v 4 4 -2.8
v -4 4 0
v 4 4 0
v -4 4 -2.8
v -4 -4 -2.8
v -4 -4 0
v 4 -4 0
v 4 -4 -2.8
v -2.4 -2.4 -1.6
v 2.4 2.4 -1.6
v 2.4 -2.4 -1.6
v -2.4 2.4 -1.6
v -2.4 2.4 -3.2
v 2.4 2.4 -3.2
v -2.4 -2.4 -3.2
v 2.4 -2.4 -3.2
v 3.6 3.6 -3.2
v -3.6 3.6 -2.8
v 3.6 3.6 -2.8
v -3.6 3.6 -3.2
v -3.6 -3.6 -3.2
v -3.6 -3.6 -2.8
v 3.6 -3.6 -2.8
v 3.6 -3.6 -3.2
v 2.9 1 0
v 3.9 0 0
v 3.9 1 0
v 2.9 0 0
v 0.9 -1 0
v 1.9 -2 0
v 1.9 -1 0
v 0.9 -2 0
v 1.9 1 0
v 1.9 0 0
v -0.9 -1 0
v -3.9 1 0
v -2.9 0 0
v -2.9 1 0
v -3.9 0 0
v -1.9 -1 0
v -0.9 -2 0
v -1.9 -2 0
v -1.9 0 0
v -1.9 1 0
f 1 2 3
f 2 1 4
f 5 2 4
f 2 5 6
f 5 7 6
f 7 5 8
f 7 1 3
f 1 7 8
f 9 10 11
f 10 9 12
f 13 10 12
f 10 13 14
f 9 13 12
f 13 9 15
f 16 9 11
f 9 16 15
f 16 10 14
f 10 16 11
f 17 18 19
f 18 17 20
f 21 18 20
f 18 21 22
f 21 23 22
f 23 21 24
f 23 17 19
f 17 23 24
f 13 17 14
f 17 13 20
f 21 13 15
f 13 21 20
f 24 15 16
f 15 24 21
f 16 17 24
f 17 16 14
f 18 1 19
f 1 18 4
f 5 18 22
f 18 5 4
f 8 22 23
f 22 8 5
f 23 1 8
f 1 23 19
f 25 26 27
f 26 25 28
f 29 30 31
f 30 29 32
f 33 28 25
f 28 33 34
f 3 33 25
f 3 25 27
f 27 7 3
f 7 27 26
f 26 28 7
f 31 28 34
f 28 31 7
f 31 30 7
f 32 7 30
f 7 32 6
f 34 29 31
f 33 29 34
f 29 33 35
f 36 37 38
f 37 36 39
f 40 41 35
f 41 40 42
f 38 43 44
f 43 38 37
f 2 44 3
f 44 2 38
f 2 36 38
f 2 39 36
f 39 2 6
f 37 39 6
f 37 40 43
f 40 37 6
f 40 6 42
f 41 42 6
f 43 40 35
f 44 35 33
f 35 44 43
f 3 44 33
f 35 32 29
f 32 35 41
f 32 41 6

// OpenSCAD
// file: ../p/4-4edge.scad
use <../lib.scad>
$fa=1; $fs=0.2;
function ldraw_lib__4_4edge(realsolid=false) = [
// 0 Circle 1.0
// 0 Name: 4-4edge.dat
// 0 Author: James Jessiman
// 0 !LDRAW_ORG Primitive UPDATE 2017-01
// 0 !LICENSE Licensed under CC BY 2.0 and CC BY 4.0 : see CAreadme.txt
// 
// 0 BFC CERTIFY CCW
  [0,"BFC","CERTIFY"],
  [0,"BFC","CCW"],
// 
// 0 !HISTORY 1998-12-15 [PTadmin] Official Update 1998-10
// 0 !HISTORY 2005-12-28 [PTadmin] Official Update 2005-01
// 0 !HISTORY 2007-06-24 [PTadmin] Header formatted for Contributor Agreement
// 0 !HISTORY 2008-07-01 [PTadmin] Official Update 2008-01
// 0 !HISTORY 2017-01-15 [Steffen] BFCed
// 0 !HISTORY 2017-12-30 [PTadmin] Official Update 2017-01
// 
// 
// 2 24 1 0 0 0.9239 0 0.3827
  [2,24,1,0,0,0.9239,0,0.3827],
// 2 24 0.9239 0 0.3827 0.7071 0 0.7071
  [2,24,0.9239,0,0.3827,0.7071,0,0.7071],
// 2 24 0.7071 0 0.7071 0.3827 0 0.9239
  [2,24,0.7071,0,0.7071,0.3827,0,0.9239],
// 2 24 0.3827 0 0.9239 0 0 1
  [2,24,0.3827,0,0.9239,0,0,1],
// 2 24 0 0 1 -0.3827 0 0.9239
  [2,24,0,0,1,-0.3827,0,0.9239],
// 2 24 -0.3827 0 0.9239 -0.7071 0 0.7071
  [2,24,-0.3827,0,0.9239,-0.7071,0,0.7071],
// 2 24 -0.7071 0 0.7071 -0.9239 0 0.3827
  [2,24,-0.7071,0,0.7071,-0.9239,0,0.3827],
// 2 24 -0.9239 0 0.3827 -1 0 -0
  [2,24,-0.9239,0,0.3827,-1,0,-0],
// 2 24 -1 0 -0 -0.9239 0 -0.3827
  [2,24,-1,0,-0,-0.9239,0,-0.3827],
// 2 24 -0.9239 0 -0.3827 -0.7071 0 -0.7071
  [2,24,-0.9239,0,-0.3827,-0.7071,0,-0.7071],
// 2 24 -0.7071 0 -0.7071 -0.3827 0 -0.9239
  [2,24,-0.7071,0,-0.7071,-0.3827,0,-0.9239],
// 2 24 -0.3827 0 -0.9239 0 0 -1
  [2,24,-0.3827,0,-0.9239,0,0,-1],
// 2 24 0 0 -1 0.3827 0 -0.9239
  [2,24,0,0,-1,0.3827,0,-0.9239],
// 2 24 0.3827 0 -0.9239 0.7071 0 -0.7071
  [2,24,0.3827,0,-0.9239,0.7071,0,-0.7071],
// 2 24 0.7071 0 -0.7071 0.9239 0 -0.3827
  [2,24,0.7071,0,-0.7071,0.9239,0,-0.3827],
// 2 24 0.9239 0 -0.3827 1 0 0
  [2,24,0.9239,0,-0.3827,1,0,0],
];
module ldraw_lib__4_4edge(step=0, col=false, unit=2/5, alt=false, line=0.2, solid=!$preview)
    makepoly(ldraw_lib__4_4edge(solid), step=step, col=col, unit=unit, alt=alt, line=line, solid=solid);
ldraw_lib__4_4edge(line=0.2);
// file: ../p/4-4disc.scad
use <../lib.scad>
$fa=1; $fs=0.2;
function ldraw_lib__4_4disc(realsolid=false) = [
// 0 Disc 1.0
// 0 Name: 4-4disc.dat
// 0 Author: James Jessiman
// 0 !LDRAW_ORG Primitive UPDATE 2002-02
// 0 !LICENSE Licensed under CC BY 2.0 and CC BY 4.0 : see CAreadme.txt
// 
// 0 BFC CERTIFY CCW
  [0,"BFC","CERTIFY"],
  [0,"BFC","CCW"],
// 
// 0 !HISTORY 1998-12-15 [PTadmin] Official Update 1998-10
// 0 !HISTORY 2002-03-23 [sbliss] Added BFC statement
// 0 !HISTORY 2002-04-25 [PTadmin] Official Update 2002-02
// 0 !HISTORY 2007-06-24 [PTadmin] Header formatted for Contributor Agreement
// 0 !HISTORY 2008-07-01 [PTadmin] Official Update 2008-01
// 
// 
// 3 16 0 0 0 1 0 0 0.9239 0 0.3827
  [3,16,0,0,0,1,0,0,0.9239,0,0.3827],
// 3 16 0 0 0 0.9239 0 0.3827 0.7071 0 0.7071
  [3,16,0,0,0,0.9239,0,0.3827,0.7071,0,0.7071],
// 3 16 0 0 0 0.7071 0 0.7071 0.3827 0 0.9239
  [3,16,0,0,0,0.7071,0,0.7071,0.3827,0,0.9239],
// 3 16 0 0 0 0.3827 0 0.9239 0 0 1
  [3,16,0,0,0,0.3827,0,0.9239,0,0,1],
// 3 16 0 0 0 0 0 1 -0.3827 0 0.9239
  [3,16,0,0,0,0,0,1,-0.3827,0,0.9239],
// 3 16 0 0 0 -0.3827 0 0.9239 -0.7071 0 0.7071
  [3,16,0,0,0,-0.3827,0,0.9239,-0.7071,0,0.7071],
// 3 16 0 0 0 -0.7071 0 0.7071 -0.9239 0 0.3827
  [3,16,0,0,0,-0.7071,0,0.7071,-0.9239,0,0.3827],
// 3 16 0 0 0 -0.9239 0 0.3827 -1 0 -0
  [3,16,0,0,0,-0.9239,0,0.3827,-1,0,-0],
// 3 16 0 0 0 -1 0 -0 -0.9239 0 -0.3827
  [3,16,0,0,0,-1,0,-0,-0.9239,0,-0.3827],
// 3 16 0 0 0 -0.9239 0 -0.3827 -0.7071 0 -0.7071
  [3,16,0,0,0,-0.9239,0,-0.3827,-0.7071,0,-0.7071],
// 3 16 0 0 0 -0.7071 0 -0.7071 -0.3827 0 -0.9239
  [3,16,0,0,0,-0.7071,0,-0.7071,-0.3827,0,-0.9239],
// 3 16 0 0 0 -0.3827 0 -0.9239 0 0 -1
  [3,16,0,0,0,-0.3827,0,-0.9239,0,0,-1],
// 3 16 0 0 0 0 0 -1 0.3827 0 -0.9239
  [3,16,0,0,0,0,0,-1,0.3827,0,-0.9239],
// 3 16 0 0 0 0.3827 0 -0.9239 0.7071 0 -0.7071
  [3,16,0,0,0,0.3827,0,-0.9239,0.7071,0,-0.7071],
// 3 16 0 0 0 0.7071 0 -0.7071 0.9239 0 -0.3827
  [3,16,0,0,0,0.7071,0,-0.7071,0.9239,0,-0.3827],
// 3 16 0 0 0 0.9239 0 -0.3827 1 0 0
  [3,16,0,0,0,0.9239,0,-0.3827,1,0,0],
// 0
];
module ldraw_lib__4_4disc(step=0, col=false, unit=2/5, alt=false, line=0.2, solid=!$preview)
    makepoly(ldraw_lib__4_4disc(solid), step=step, col=col, unit=unit, alt=alt, line=line, solid=solid);
ldraw_lib__4_4disc(line=0.2);
// file: ../p/4-4cyli.scad
use <../lib.scad>
$fa=1; $fs=0.2;
function ldraw_lib__4_4cyli(realsolid=false) = [
// 0 Cylinder 1.0
// 0 Name: 4-4cyli.dat
// 0 Author: James Jessiman
// 0 !LDRAW_ORG Primitive UPDATE 2005-01
// 0 !LICENSE Licensed under CC BY 2.0 and CC BY 4.0 : see CAreadme.txt
// 
// 0 BFC CERTIFY CCW
  [0,"BFC","CERTIFY"],
  [0,"BFC","CCW"],
// 
// 0 !HISTORY 1998-12-15 [PTadmin] Official Update 1998-10
// 0 !HISTORY 2002-03-23 [sbliss] Added BFC statement; merged headers from files in distributions LDraw 0.27 and Complete.
// 0 !HISTORY 2002-04-25 [PTadmin] Official Update 2002-02
// 0 !HISTORY 2004-12-14 [guyvivan] BFC CCW
// 0 !HISTORY 2005-12-28 [PTadmin] Official Update 2005-01
// 0 !HISTORY 2007-06-24 [PTadmin] Header formatted for Contributor Agreement
// 0 !HISTORY 2008-07-01 [PTadmin] Official Update 2008-01
// 
// 
// 4 16 1 1 0 0.9239 1 0.3827 0.9239 0 0.3827 1 0 0
  [4,16,1,1,0,0.9239,1,0.3827,0.9239,0,0.3827,1,0,0],
// 5 24 1 0 0 1 1 0 0.9239 0 0.3827 0.9239 0 -0.3827
  [5,24,1,0,0,1,1,0,0.9239,0,0.3827,0.9239,0,-0.3827],
// 4 16 0.9239 1 0.3827 0.7071 1 0.7071 0.7071 0 0.7071 0.9239 0 0.3827
  [4,16,0.9239,1,0.3827,0.7071,1,0.7071,0.7071,0,0.7071,0.9239,0,0.3827],
// 5 24 0.9239 0 0.3827 0.9239 1 0.3827 0.7071 0 0.7071 1 0 0
  [5,24,0.9239,0,0.3827,0.9239,1,0.3827,0.7071,0,0.7071,1,0,0],
// 4 16 0.7071 1 0.7071 0.3827 1 0.9239 0.3827 0 0.9239 0.7071 0 0.7071
  [4,16,0.7071,1,0.7071,0.3827,1,0.9239,0.3827,0,0.9239,0.7071,0,0.7071],
// 5 24 0.7071 0 0.7071 0.7071 1 0.7071 0.3827 0 0.9239 0.9239 0 0.3827
  [5,24,0.7071,0,0.7071,0.7071,1,0.7071,0.3827,0,0.9239,0.9239,0,0.3827],
// 4 16 0.3827 1 0.9239 0 1 1 0 0 1 0.3827 0 0.9239
  [4,16,0.3827,1,0.9239,0,1,1,0,0,1,0.3827,0,0.9239],
// 5 24 0.3827 0 0.9239 0.3827 1 0.9239 0 0 1 0.7071 0 0.7071
  [5,24,0.3827,0,0.9239,0.3827,1,0.9239,0,0,1,0.7071,0,0.7071],
// 4 16 0 1 1 -0.3827 1 0.9239 -0.3827 0 0.9239 0 0 1
  [4,16,0,1,1,-0.3827,1,0.9239,-0.3827,0,0.9239,0,0,1],
// 5 24 0 0 1 0 1 1 -0.3827 0 0.9239 0.3827 0 0.9239
  [5,24,0,0,1,0,1,1,-0.3827,0,0.9239,0.3827,0,0.9239],
// 4 16 -0.3827 1 0.9239 -0.7071 1 0.7071 -0.7071 0 0.7071 -0.3827 0 0.9239
  [4,16,-0.3827,1,0.9239,-0.7071,1,0.7071,-0.7071,0,0.7071,-0.3827,0,0.9239],
// 5 24 -0.3827 0 0.9239 -0.3827 1 0.9239 -0.7071 0 0.7071 0 0 1
  [5,24,-0.3827,0,0.9239,-0.3827,1,0.9239,-0.7071,0,0.7071,0,0,1],
// 4 16 -0.7071 1 0.7071 -0.9239 1 0.3827 -0.9239 0 0.3827 -0.7071 0 0.7071
  [4,16,-0.7071,1,0.7071,-0.9239,1,0.3827,-0.9239,0,0.3827,-0.7071,0,0.7071],
// 5 24 -0.7071 0 0.7071 -0.7071 1 0.7071 -0.9239 0 0.3827 -0.3827 0 0.9239
  [5,24,-0.7071,0,0.7071,-0.7071,1,0.7071,-0.9239,0,0.3827,-0.3827,0,0.9239],
// 4 16 -0.9239 1 0.3827 -1 1 0 -1 0 0 -0.9239 0 0.3827
  [4,16,-0.9239,1,0.3827,-1,1,0,-1,0,0,-0.9239,0,0.3827],
// 5 24 -0.9239 0 0.3827 -0.9239 1 0.3827 -1 0 0 -0.7071 0 0.7071
  [5,24,-0.9239,0,0.3827,-0.9239,1,0.3827,-1,0,0,-0.7071,0,0.7071],
// 4 16 -1 1 0 -0.9239 1 -0.3827 -0.9239 0 -0.3827 -1 0 0
  [4,16,-1,1,0,-0.9239,1,-0.3827,-0.9239,0,-0.3827,-1,0,0],
// 5 24 -1 0 0 -1 1 0 -0.9239 0 -0.3827 -0.9239 0 0.3827
  [5,24,-1,0,0,-1,1,0,-0.9239,0,-0.3827,-0.9239,0,0.3827],
// 4 16 -0.9239 1 -0.3827 -0.7071 1 -0.7071 -0.7071 0 -0.7071 -0.9239 0 -0.3827
  [4,16,-0.9239,1,-0.3827,-0.7071,1,-0.7071,-0.7071,0,-0.7071,-0.9239,0,-0.3827],
// 5 24 -0.9239 0 -0.3827 -0.9239 1 -0.3827 -0.7071 0 -0.7071 -1 0 0
  [5,24,-0.9239,0,-0.3827,-0.9239,1,-0.3827,-0.7071,0,-0.7071,-1,0,0],
// 4 16 -0.7071 1 -0.7071 -0.3827 1 -0.9239 -0.3827 0 -0.9239 -0.7071 0 -0.7071
  [4,16,-0.7071,1,-0.7071,-0.3827,1,-0.9239,-0.3827,0,-0.9239,-0.7071,0,-0.7071],
// 5 24 -0.7071 0 -0.7071 -0.7071 1 -0.7071 -0.3827 0 -0.9239 -0.9239 0 -0.3827
  [5,24,-0.7071,0,-0.7071,-0.7071,1,-0.7071,-0.3827,0,-0.9239,-0.9239,0,-0.3827],
// 4 16 -0.3827 1 -0.9239 0 1 -1 0 0 -1 -0.3827 0 -0.9239
  [4,16,-0.3827,1,-0.9239,0,1,-1,0,0,-1,-0.3827,0,-0.9239],
// 5 24 -0.3827 0 -0.9239 -0.3827 1 -0.9239 0 0 -1 -0.7071 0 -0.7071
  [5,24,-0.3827,0,-0.9239,-0.3827,1,-0.9239,0,0,-1,-0.7071,0,-0.7071],
// 4 16 0 1 -1 0.3827 1 -0.9239 0.3827 0 -0.9239 0 0 -1
  [4,16,0,1,-1,0.3827,1,-0.9239,0.3827,0,-0.9239,0,0,-1],
// 5 24 0 0 -1 0 1 -1 0.3827 0 -0.9239 -0.3827 0 -0.9239
  [5,24,0,0,-1,0,1,-1,0.3827,0,-0.9239,-0.3827,0,-0.9239],
// 4 16 0.3827 1 -0.9239 0.7071 1 -0.7071 0.7071 0 -0.7071 0.3827 0 -0.9239
  [4,16,0.3827,1,-0.9239,0.7071,1,-0.7071,0.7071,0,-0.7071,0.3827,0,-0.9239],
// 5 24 0.3827 0 -0.9239 0.3827 1 -0.9239 0.7071 0 -0.7071 0 0 -1
  [5,24,0.3827,0,-0.9239,0.3827,1,-0.9239,0.7071,0,-0.7071,0,0,-1],
// 4 16 0.7071 1 -0.7071 0.9239 1 -0.3827 0.9239 0 -0.3827 0.7071 0 -0.7071
  [4,16,0.7071,1,-0.7071,0.9239,1,-0.3827,0.9239,0,-0.3827,0.7071,0,-0.7071],
// 5 24 0.7071 0 -0.7071 0.7071 1 -0.7071 0.9239 0 -0.3827 0.3827 0 -0.9239
  [5,24,0.7071,0,-0.7071,0.7071,1,-0.7071,0.9239,0,-0.3827,0.3827,0,-0.9239],
// 4 16 0.9239 1 -0.3827 1 1 0 1 0 0 0.9239 0 -0.3827
  [4,16,0.9239,1,-0.3827,1,1,0,1,0,0,0.9239,0,-0.3827],
// 5 24 0.9239 0 -0.3827 0.9239 1 -0.3827 1 0 0 0.7071 0 -0.7071
  [5,24,0.9239,0,-0.3827,0.9239,1,-0.3827,1,0,0,0.7071,0,-0.7071],
// 0
];
module ldraw_lib__4_4cyli(step=0, col=false, unit=2/5, alt=false, line=0.2, solid=!$preview)
    makepoly(ldraw_lib__4_4cyli(solid), step=step, col=col, unit=unit, alt=alt, line=line, solid=solid);
ldraw_lib__4_4cyli(line=0.2);
// file: ../p/stud3.scad
use <../lib.scad>
use <4-4cyli.scad>
use <4-4disc.scad>
use <4-4edge.scad>
$fa=1; $fs=0.2;
function ldraw_lib__stud3(realsolid=false) = realsolid ? 
    [openscad(translate([0,0,-eps()], o=cylinder(4+eps(), r=4)),2)] : [
// 0 Stud Tube Solid
// 0 Name: stud3.dat
// 0 Author: James Jessiman
// 0 !LDRAW_ORG Primitive UPDATE 2012-01
// 0 !LICENSE Licensed under CC BY 2.0 and CC BY 4.0 : see CAreadme.txt
// 
// 0 BFC CERTIFY CCW
  [0,"BFC","CERTIFY"],
  [0,"BFC","CCW"],
// 
// 0 !HISTORY 2002-04-04 [sbliss] Modified for BFC compliance
// 0 !HISTORY 2002-04-25 [PTadmin] Official Update 2002-02
// 0 !HISTORY 2007-06-24 [PTadmin] Header formatted for Contributor Agreement
// 0 !HISTORY 2008-07-01 [PTadmin] Official Update 2008-01
// 0 !HISTORY 2012-02-16 [Philo] Changed to CCW
// 0 !HISTORY 2012-03-30 [PTadmin] Official Update 2012-01
// 
// 
// 1 16 0 -4 0 4 0 0 0 1 0 0 0 4 4-4edge.dat
  [1,16,0,-4,0,4,0,0,0,1,0,0,0,4, ldraw_lib__4_4edge(realsolid)],
// 1 16 0 0 0 4 0 0 0 1 0 0 0 4 4-4edge.dat
  [1,16,0,0,0,4,0,0,0,1,0,0,0,4, ldraw_lib__4_4edge(realsolid)],
// 1 16 0 -4 0 4 0 0 0 1 0 0 0 4 4-4disc.dat
  [1,16,0,-4,0,4,0,0,0,1,0,0,0,4, ldraw_lib__4_4disc(realsolid)],
// 1 16 0 -4 0 4 0 0 0 4 0 0 0 4 4-4cyli.dat
  [1,16,0,-4,0,4,0,0,0,4,0,0,0,4, ldraw_lib__4_4cyli(realsolid)],
];
module ldraw_lib__stud3(step=0, col=false, unit=2/5, alt=false, line=0.2, solid=!$preview)
    makepoly(ldraw_lib__stud3(solid), step=step, col=col, unit=unit, alt=alt, line=line, solid=solid);
ldraw_lib__stud3(line=0.2);
// file: ../p/stud.scad
use <../lib.scad>
use <4-4cyli.scad>
use <4-4disc.scad>
use <4-4edge.scad>
$fa=1; $fs=0.2;
function ldraw_lib__stud(realsolid=false) = realsolid ? 
    [openscad(translate([0,0,-eps()], o=cylinder(4+eps(), r=6)),2)] : [
// 0 Stud
// 0 Name: stud.dat
// 0 Author: James Jessiman
// 0 !LDRAW_ORG Primitive UPDATE 2012-01
// 0 !LICENSE Licensed under CC BY 2.0 and CC BY 4.0 : see CAreadme.txt
// 
// 0 BFC CERTIFY CCW
  [0,"BFC","CERTIFY"],
  [0,"BFC","CCW"],
// 
// 0 !HISTORY 2002-04-04 [sbliss] Modified for BFC compliance
// 0 !HISTORY 2002-04-25 [PTadmin] Official Update 2002-02
// 0 !HISTORY 2007-06-24 [PTadmin] Header formatted for Contributor Agreement
// 0 !HISTORY 2008-07-01 [PTadmin] Official Update 2008-01
// 0 !HISTORY 2012-02-16 [Philo] Changed to CCW
// 0 !HISTORY 2012-03-30 [PTadmin] Official Update 2012-01
// 
// 
// 1 16 0 0 0 6 0 0 0 1 0 0 0 6 4-4edge.dat
  [1,16,0,0,0,6,0,0,0,1,0,0,0,6, ldraw_lib__4_4edge(realsolid)],
// 1 16 0 -4 0 6 0 0 0 1 0 0 0 6 4-4edge.dat
  [1,16,0,-4,0,6,0,0,0,1,0,0,0,6, ldraw_lib__4_4edge(realsolid)],
// 1 16 0 0 0 6 0 0 0 -4 0 0 0 6 4-4cyli.dat
  [1,16,0,0,0,6,0,0,0,-4,0,0,0,6, ldraw_lib__4_4cyli(realsolid)],
// 1 16 0 -4 0 6 0 0 0 1 0 0 0 6 4-4disc.dat
  [1,16,0,-4,0,6,0,0,0,1,0,0,0,6, ldraw_lib__4_4disc(realsolid)],
];
module ldraw_lib__stud(step=0, col=false, unit=2/5, alt=false, line=0.2, solid=!$preview)
    makepoly(ldraw_lib__stud(solid), step=step, col=col, unit=unit, alt=alt, line=line, solid=solid);
ldraw_lib__stud(line=0.2);
// file: ../p/box4t.scad
use <../lib.scad>
$fa=1; $fs=0.2;
function ldraw_lib__box4t(realsolid=false) = [
// 0 Box with 4 Adjacent Faces and All Edges
// 0 Name: box4t.dat
// 0 Author: Tore Eriksson [Tore_Eriksson]
// 0 !LDRAW_ORG Primitive UPDATE 2003-02
// 0 !LICENSE Licensed under CC BY 2.0 and CC BY 4.0 : see CAreadme.txt
// 
// 0 BFC CERTIFY CCW
  [0,"BFC","CERTIFY"],
  [0,"BFC","CCW"],
// 
// 0 !HISTORY 1997-09-29 [PTadmin] Official Update 1997-15
// 0 !HISTORY 2002-08-31 [izanette] Modified with WINDZ for BFC compliance
// 0 !HISTORY 2003-08-01 [PTadmin] Official Update 2003-02
// 0 !HISTORY 2007-06-24 [PTadmin] Header formatted for Contributor Agreement
// 0 !HISTORY 2008-07-01 [PTadmin] Official Update 2008-01
// 
// 
// 2 24 1 1 1 -1 1 1
  [2,24,1,1,1,-1,1,1],
// 2 24 -1 1 1 -1 1 -1
  [2,24,-1,1,1,-1,1,-1],
// 2 24 -1 1 -1 1 1 -1
  [2,24,-1,1,-1,1,1,-1],
// 2 24 1 1 -1 1 1 1
  [2,24,1,1,-1,1,1,1],
// 2 24 1 0 1 -1 0 1
  [2,24,1,0,1,-1,0,1],
// 2 24 -1 0 1 -1 0 -1
  [2,24,-1,0,1,-1,0,-1],
// 2 24 -1 0 -1 1 0 -1
  [2,24,-1,0,-1,1,0,-1],
// 2 24 1 0 -1 1 0 1
  [2,24,1,0,-1,1,0,1],
// 2 24 1 0 1 1 1 1
  [2,24,1,0,1,1,1,1],
// 2 24 -1 0 1 -1 1 1
  [2,24,-1,0,1,-1,1,1],
// 2 24 1 0 -1 1 1 -1
  [2,24,1,0,-1,1,1,-1],
// 2 24 -1 0 -1 -1 1 -1
  [2,24,-1,0,-1,-1,1,-1],
// 4 16 1 1 1 1 1 -1 -1 1 -1 -1 1 1
  [4,16,1,1,1,1,1,-1,-1,1,-1,-1,1,1],
// 4 16 1 1 1 -1 1 1 -1 0 1 1 0 1
  [4,16,1,1,1,-1,1,1,-1,0,1,1,0,1],
// 4 16 -1 1 1 -1 1 -1 -1 0 -1 -1 0 1
  [4,16,-1,1,1,-1,1,-1,-1,0,-1,-1,0,1],
// 0 4 16 -1 1 -1 -1 0 -1 1 0 -1 1 1 -1
// 4 16 1 1 -1 1 1 1 1 0 1 1 0 -1
  [4,16,1,1,-1,1,1,1,1,0,1,1,0,-1],
// 0
];
module ldraw_lib__box4t(step=0, col=false, unit=2/5, alt=false, line=0.2, solid=!$preview)
    makepoly(ldraw_lib__box4t(solid), step=step, col=col, unit=unit, alt=alt, line=line, solid=solid);
ldraw_lib__box4t(line=0.2);
// file: s/3004s01.scad
use <../../lib.scad>
use <../../p/box4t.scad>
use <../../p/box5.scad>
use <../../p/stud.scad>
use <../../p/stud3.scad>
$fa=1; $fs=0.2;
function ldraw_lib__s__3004s01(realsolid=false) = [
// 0 ~Brick  1 x  2 without Front Face
// 0 Name: s\3004s01.dat
// 0 Author: James Jessiman
// 0 !LDRAW_ORG Subpart UPDATE 2003-03
// 0 !LICENSE Licensed under CC BY 2.0 and CC BY 4.0 : see CAreadme.txt
// 
// 0 BFC CERTIFY CCW
  [0,"BFC","CERTIFY"],
  [0,"BFC","CCW"],
// 
// 0 !HISTORY 2003-09-07 [jriley] Subfiling, BFC
// 0 !HISTORY 2003-12-19 [PTadmin] Official Update 2003-03
// 0 !HISTORY 2007-08-29 [PTadmin] Header formatted for Contributor Agreement
// 0 !HISTORY 2008-07-01 [PTadmin] Official Update 2008-01
// 
// 
// 1 16 0 4 0 1 0 0 0 -5 0 0 0 1 stud3.dat
  [1,16,0,4,0,1,0,0,0,-5,0,0,0,1, ldraw_lib__stud3(realsolid)],
// 0 BFC INVERTNEXT
  [0,"BFC","INVERTNEXT"],
// 1 16 0 24 0 16 0 0 0 -20 0 0 0 6 box5.dat
  [1,16,0,24,0,16,0,0,0,-20,0,0,0,6, ldraw_lib__box5(realsolid)],
// 4 16 20 24 10 16 24 6 -16 24 6 -20 24 10
  [4,16,20,24,10,16,24,6,-16,24,6,-20,24,10],
// 4 16 -20 24 10 -16 24 6 -16 24 -6 -20 24 -10
  [4,16,-20,24,10,-16,24,6,-16,24,-6,-20,24,-10],
// 4 16 -20 24 -10 -16 24 -6 16 24 -6 20 24 -10
  [4,16,-20,24,-10,-16,24,-6,16,24,-6,20,24,-10],
// 4 16 20 24 -10 16 24 -6 16 24 6 20 24 10
  [4,16,20,24,-10,16,24,-6,16,24,6,20,24,10],
// 1 16 0 24 0 20 0 0 0 -24 0 0 0 10 box4t.dat
  [1,16,0,24,0,20,0,0,0,-24,0,0,0,10, ldraw_lib__box4t(realsolid)],
// 1 16 10 0 0 1 0 0 0 1 0 0 0 1 stud.dat
  [1,16,10,0,0,1,0,0,0,1,0,0,0,1, ldraw_lib__stud(realsolid)],
// 1 16 -10 0 0 1 0 0 0 1 0 0 0 1 stud.dat
  [1,16,-10,0,0,1,0,0,0,1,0,0,0,1, ldraw_lib__stud(realsolid)],
// 0
];
module ldraw_lib__s__3004s01(step=0, col=false, unit=2/5, alt=false, line=0.2, solid=!$preview)
    makepoly(ldraw_lib__s__3004s01(solid), step=step, col=col, unit=unit, alt=alt, line=line, solid=solid);
ldraw_lib__s__3004s01(line=0.2);
// file: ../p/box5.scad
use <../lib.scad>
$fa=1; $fs=0.2;
function ldraw_lib__box5(realsolid=false) = [
// 0 Box with 5 Faces and All Edges
// 0 Name: box5.dat
// 0 Author: James Jessiman
// 0 !LDRAW_ORG Primitive UPDATE 2012-01
// 0 !LICENSE Licensed under CC BY 2.0 and CC BY 4.0 : see CAreadme.txt
// 
// 0 BFC CERTIFY CCW
  [0,"BFC","CERTIFY"],
  [0,"BFC","CCW"],
// 
// 0 !HISTORY 2002-04-03 [sbliss] Modified for BFC compliance
// 0 !HISTORY 2002-04-25 [PTadmin] Official Update 2002-02
// 0 !HISTORY 2007-06-24 [PTadmin] Header formatted for Contributor Agreement
// 0 !HISTORY 2008-07-01 [PTadmin] Official Update 2008-01
// 0 !HISTORY 2012-02-16 [Philo] Changed to CCW
// 0 !HISTORY 2012-03-30 [PTadmin] Official Update 2012-01
// 
// 
// 2 24 1 1 1 -1 1 1
  [2,24,1,1,1,-1,1,1],
// 2 24 -1 1 1 -1 1 -1
  [2,24,-1,1,1,-1,1,-1],
// 2 24 -1 1 -1 1 1 -1
  [2,24,-1,1,-1,1,1,-1],
// 2 24 1 1 -1 1 1 1
  [2,24,1,1,-1,1,1,1],
// 2 24 1 0 1 -1 0 1
  [2,24,1,0,1,-1,0,1],
// 2 24 -1 0 1 -1 0 -1
  [2,24,-1,0,1,-1,0,-1],
// 2 24 -1 0 -1 1 0 -1
  [2,24,-1,0,-1,1,0,-1],
// 2 24 1 0 -1 1 0 1
  [2,24,1,0,-1,1,0,1],
// 2 24 1 0 1 1 1 1
  [2,24,1,0,1,1,1,1],
// 2 24 -1 0 1 -1 1 1
  [2,24,-1,0,1,-1,1,1],
// 2 24 1 0 -1 1 1 -1
  [2,24,1,0,-1,1,1,-1],
// 2 24 -1 0 -1 -1 1 -1
  [2,24,-1,0,-1,-1,1,-1],
// 4 16 -1 1 1 1 1 1 1 1 -1 -1 1 -1
  [4,16,-1,1,1,1,1,1,1,1,-1,-1,1,-1],
// 4 16 -1 1 1 -1 0 1 1 0 1 1 1 1
  [4,16,-1,1,1,-1,0,1,1,0,1,1,1,1],
// 4 16 -1 1 -1 -1 0 -1 -1 0 1 -1 1 1
  [4,16,-1,1,-1,-1,0,-1,-1,0,1,-1,1,1],
// 4 16 1 1 -1 1 0 -1 -1 0 -1 -1 1 -1
  [4,16,1,1,-1,1,0,-1,-1,0,-1,-1,1,-1],
// 4 16 1 1 1 1 0 1 1 0 -1 1 1 -1
  [4,16,1,1,1,1,0,1,1,0,-1,1,1,-1],
];
module ldraw_lib__box5(step=0, col=false, unit=2/5, alt=false, line=0.2, solid=!$preview)
    makepoly(ldraw_lib__box5(solid), step=step, col=col, unit=unit, alt=alt, line=line, solid=solid);
ldraw_lib__box5(line=0.2);
// file: ../p/box4.scad
use <../lib.scad>
$fa=1; $fs=0.2;
function ldraw_lib__box4(realsolid=false) = [
// 0 Box with 4 Faces (2 Parallel Pairs) and All Edges
// 0 Name: box4.dat
// 0 Author: James Jessiman
// 0 !LDRAW_ORG Primitive UPDATE 2012-01
// 0 !LICENSE Licensed under CC BY 2.0 and CC BY 4.0 : see CAreadme.txt
// 
// 0 BFC CERTIFY CCW
  [0,"BFC","CERTIFY"],
  [0,"BFC","CCW"],
// 
// 0 !HISTORY 2002-04-03 [sbliss] Modified for BFC compliance
// 0 !HISTORY 2002-04-25 [PTadmin] Official Update 2002-02
// 0 !HISTORY 2007-06-24 [PTadmin] Header formatted for Contributor Agreement
// 0 !HISTORY 2008-07-01 [PTadmin] Official Update 2008-01
// 0 !HISTORY 2012-02-16 [Philo] Changed to CCW
// 0 !HISTORY 2012-03-30 [PTadmin] Official Update 2012-01
// 
// 
// 2 24 1 1 1 -1 1 1
  [2,24,1,1,1,-1,1,1],
// 2 24 -1 1 1 -1 1 -1
  [2,24,-1,1,1,-1,1,-1],
// 2 24 -1 1 -1 1 1 -1
  [2,24,-1,1,-1,1,1,-1],
// 2 24 1 1 -1 1 1 1
  [2,24,1,1,-1,1,1,1],
// 2 24 1 0 1 -1 0 1
  [2,24,1,0,1,-1,0,1],
// 2 24 -1 0 1 -1 0 -1
  [2,24,-1,0,1,-1,0,-1],
// 2 24 -1 0 -1 1 0 -1
  [2,24,-1,0,-1,1,0,-1],
// 2 24 1 0 -1 1 0 1
  [2,24,1,0,-1,1,0,1],
// 2 24 1 0 1 1 1 1
  [2,24,1,0,1,1,1,1],
// 2 24 -1 0 1 -1 1 1
  [2,24,-1,0,1,-1,1,1],
// 2 24 1 0 -1 1 1 -1
  [2,24,1,0,-1,1,1,-1],
// 2 24 -1 0 -1 -1 1 -1
  [2,24,-1,0,-1,-1,1,-1],
// 4 16 -1 1 1 -1 0 1 1 0 1 1 1 1
  [4,16,-1,1,1,-1,0,1,1,0,1,1,1,1],
// 4 16 -1 1 -1 -1 0 -1 -1 0 1 -1 1 1
  [4,16,-1,1,-1,-1,0,-1,-1,0,1,-1,1,1],
// 4 16 1 1 -1 1 0 -1 -1 0 -1 -1 1 -1
  [4,16,1,1,-1,1,0,-1,-1,0,-1,-1,1,-1],
// 4 16 1 1 1 1 0 1 1 0 -1 1 1 -1
  [4,16,1,1,1,1,0,1,1,0,-1,1,1,-1],
];
module ldraw_lib__box4(step=0, col=false, unit=2/5, alt=false, line=0.2, solid=!$preview)
    makepoly(ldraw_lib__box4(solid), step=step, col=col, unit=unit, alt=alt, line=line, solid=solid);
ldraw_lib__box4(line=0.2);
// file: 3004.scad
use <../lib.scad>
use <s/3004s01.scad>
$fa=1; $fs=0.2;
function ldraw_lib__3004(realsolid=false) = [
// 0 Brick  1 x  2
// 0 Name: 3004.dat
// 0 Author: James Jessiman
// 0 !LDRAW_ORG Part UPDATE 2022-05
// 0 !LICENSE Licensed under CC BY 2.0 and CC BY 4.0 : see CAreadme.txt
// 
// 0 BFC CERTIFY CCW
  [0,"BFC","CERTIFY"],
  [0,"BFC","CCW"],
// 
// 0 !HISTORY 2001-10-26 [PTadmin] Official Update 2001-01
// 0 !HISTORY 2002-05-07 {unknown} BFC Certification
// 0 !HISTORY 2002-06-11 [PTadmin] Official Update 2002-03
// 0 !HISTORY 2007-05-07 [PTadmin] Header formatted for Contributor Agreement
// 0 !HISTORY 2008-07-01 [PTadmin] Official Update 2008-01
// 0 !HISTORY 2022-08-04 [MagFors] Using subfile
// 0 !HISTORY 2022-09-15 [PTadmin] Official Update 2022-05
// 
// 
// 1 16 0 0 0 1 0 0 0 1 0 0 0 1 s\3004s01.dat
  [1,16,0,0,0,1,0,0,0,1,0,0,0,1, ldraw_lib__s__3004s01(realsolid)],
// 4 16 -20 24 -10 20 24 -10 20 0 -10 -20 0 -10
  [4,16,-20,24,-10,20,24,-10,20,0,-10,-20,0,-10],
];
module ldraw_lib__3004(step=0, col=false, unit=2/5, alt=false, line=0.2, solid=!$preview)
    makepoly(ldraw_lib__3004(solid), step=step, col=col, unit=unit, alt=alt, line=line, solid=solid);
ldraw_lib__3004(line=0.2);
// file: s/3070bs01.scad
use <../../lib.scad>
use <../../p/box4.scad>
use <../../p/box5.scad>
$fa=1; $fs=0.2;
function ldraw_lib__s__3070bs01(realsolid=false) = [
// 0 ~Tile  1 x  1 with Groove without Top Face
// 0 Name: s\3070bs01.dat
// 0 Author: Chris Dee [cwdee]
// 0 !LDRAW_ORG Subpart UPDATE 2009-02
// 0 !LICENSE Licensed under CC BY 2.0 and CC BY 4.0 : see CAreadme.txt
// 
// 0 BFC CERTIFY CCW
  [0,"BFC","CERTIFY"],
  [0,"BFC","CCW"],
// 
// 0 !HISTORY 2009-09-03 [PTadmin] Official Update 2009-02
// 
// 
// 1 16 0 0 0 10 0 0 0 7 0 0 0 10 box4.dat
  [1,16,0,0,0,10,0,0,0,7,0,0,0,10, ldraw_lib__box4(realsolid)],
// 0 BFC INVERTNEXT
  [0,"BFC","INVERTNEXT"],
// 1 16 0 8 0 6 0 0 0 -4 0 0 0 6 box5.dat
  [1,16,0,8,0,6,0,0,0,-4,0,0,0,6, ldraw_lib__box5(realsolid)],
// 1 16 0 7 0 9 0 0 0 1 0 0 0 9 box4.dat
  [1,16,0,7,0,9,0,0,0,1,0,0,0,9, ldraw_lib__box4(realsolid)],
// 
// 4 16 9 8 9 6 8 6 -6 8 6 -9 8 9
  [4,16,9,8,9,6,8,6,-6,8,6,-9,8,9],
// 4 16 -9 8 9 -6 8 6 -6 8 -6 -9 8 -9
  [4,16,-9,8,9,-6,8,6,-6,8,-6,-9,8,-9],
// 4 16 -9 8 -9 -6 8 -6 6 8 -6 9 8 -9
  [4,16,-9,8,-9,-6,8,-6,6,8,-6,9,8,-9],
// 4 16 9 8 -9 6 8 -6 6 8 6 9 8 9
  [4,16,9,8,-9,6,8,-6,6,8,6,9,8,9],
// 
// 4 16 10 7 10 9 7 9 -9 7 9 -10 7 10
  [4,16,10,7,10,9,7,9,-9,7,9,-10,7,10],
// 4 16 -10 7 10 -9 7 9 -9 7 -9 -10 7 -10
  [4,16,-10,7,10,-9,7,9,-9,7,-9,-10,7,-10],
// 4 16 -10 7 -10 -9 7 -9 9 7 -9 10 7 -10
  [4,16,-10,7,-10,-9,7,-9,9,7,-9,10,7,-10],
// 4 16 10 7 -10 9 7 -9 9 7 9 10 7 10
  [4,16,10,7,-10,9,7,-9,9,7,9,10,7,10],
// 0
];
module ldraw_lib__s__3070bs01(step=0, col=false, unit=2/5, alt=false, line=0.2, solid=!$preview)
    makepoly(ldraw_lib__s__3070bs01(solid), step=step, col=col, unit=unit, alt=alt, line=line, solid=solid);
ldraw_lib__s__3070bs01(line=0.2);
// main file
use <../lib.scad>
use <s/3070bs01.scad>
$fa=1; $fs=0.2;
function ldraw_lib__3070bpt1(realsolid=false) = [
// 0 Tile  1 x  1 with Minecraft Micro Mob Pig Face Pattern
// 0 Name: 3070bpt1.dat
// 0 Author: Philippe Hurbain [Philo]
// 0 !LDRAW_ORG Part UPDATE 2014-01
// 0 !LICENSE Licensed under CC BY 2.0 and CC BY 4.0 : see CAreadme.txt
// 
// 0 BFC CERTIFY CCW
  [0,"BFC","CERTIFY"],
  [0,"BFC","CCW"],
// 
// 0 !HISTORY 2014-06-21 [PTadmin] Official Update 2014-01
// 
// 
// 1 16 0 0 0 1 0 0 0 1 0 0 0 1 s\3070bs01.dat
  [1,16,0,0,0,1,0,0,0,1,0,0,0,1, ldraw_lib__s__3070bs01(realsolid)],
// 4 0 7.25 0 0 9.75 0 0 9.75 0 2.5 7.25 0 2.5
  [4,0,7.25,0,0,9.75,0,0,9.75,0,2.5,7.25,0,2.5],
// 4 0 2.25 0 -5 4.75 0 -5 4.75 0 -2.5 2.25 0 -2.5
  [4,0,2.25,0,-5,4.75,0,-5,4.75,0,-2.5,2.25,0,-2.5],
// 4 77 4.75 0 0 7.25 0 0 7.25 0 2.5 4.75 0 2.5
  [4,77,4.75,0,0,7.25,0,0,7.25,0,2.5,4.75,0,2.5],
// 3 16 10 0 10 4.75 0 2.5 7.25 0 2.5
  [3,16,10,0,10,4.75,0,2.5,7.25,0,2.5],
// 3 16 10 0 10 7.25 0 2.5 9.75 0 2.5
  [3,16,10,0,10,7.25,0,2.5,9.75,0,2.5],
// 4 16 10 0 10 9.75 0 2.5 9.75 0 0 10 0 -10
  [4,16,10,0,10,9.75,0,2.5,9.75,0,0,10,0,-10],
// 3 16 9.75 0 0 7.25 0 0 10 0 -10
  [3,16,9.75,0,0,7.25,0,0,10,0,-10],
// 4 16 10 0 -10 7.25 0 0 4.75 0 0 4.75 0 -2.5
  [4,16,10,0,-10,7.25,0,0,4.75,0,0,4.75,0,-2.5],
// 3 16 4.75 0 -2.5 4.75 0 -5 10 0 -10
  [3,16,4.75,0,-2.5,4.75,0,-5,10,0,-10],
// 4 16 10 0 -10 4.75 0 -5 2.25 0 -5 -10 0 -10
  [4,16,10,0,-10,4.75,0,-5,2.25,0,-5,-10,0,-10],
// 3 16 4.75 0 0 2.25 0 -2.5 4.75 0 -2.5
  [3,16,4.75,0,0,2.25,0,-2.5,4.75,0,-2.5],
// 4 16 2.25 0 -2.5 4.75 0 0 4.75 0 2.5 -2.25 0 -2.5
  [4,16,2.25,0,-2.5,4.75,0,0,4.75,0,2.5,-2.25,0,-2.5],
// 4 0 -9.75 0 2.5 -9.75 0 0 -7.25 0 0 -7.25 0 2.5
  [4,0,-9.75,0,2.5,-9.75,0,0,-7.25,0,0,-7.25,0,2.5],
// 4 0 -4.75 0 -2.5 -4.75 0 -5 -2.25 0 -5 -2.25 0 -2.5
  [4,0,-4.75,0,-2.5,-4.75,0,-5,-2.25,0,-5,-2.25,0,-2.5],
// 4 77 -7.25 0 2.5 -7.25 0 0 -4.75 0 0 -4.75 0 2.5
  [4,77,-7.25,0,2.5,-7.25,0,0,-4.75,0,0,-4.75,0,2.5],
// 4 16 -10 0 10 -7.25 0 2.5 -4.75 0 2.5 10 0 10
  [4,16,-10,0,10,-7.25,0,2.5,-4.75,0,2.5,10,0,10],
// 3 16 -10 0 10 -9.75 0 2.5 -7.25 0 2.5
  [3,16,-10,0,10,-9.75,0,2.5,-7.25,0,2.5],
// 4 16 -9.75 0 0 -9.75 0 2.5 -10 0 10 -10 0 -10
  [4,16,-9.75,0,0,-9.75,0,2.5,-10,0,10,-10,0,-10],
// 3 16 -7.25 0 0 -9.75 0 0 -10 0 -10
  [3,16,-7.25,0,0,-9.75,0,0,-10,0,-10],
// 4 16 -4.75 0 0 -7.25 0 0 -10 0 -10 -4.75 0 -2.5
  [4,16,-4.75,0,0,-7.25,0,0,-10,0,-10,-4.75,0,-2.5],
// 3 16 -4.75 0 -2.5 -10 0 -10 -4.75 0 -5
  [3,16,-4.75,0,-2.5,-10,0,-10,-4.75,0,-5],
// 3 16 -2.25 0 -5 -4.75 0 -5 -10 0 -10
  [3,16,-2.25,0,-5,-4.75,0,-5,-10,0,-10],
// 3 16 -4.75 0 0 -4.75 0 -2.5 -2.25 0 -2.5
  [3,16,-4.75,0,0,-4.75,0,-2.5,-2.25,0,-2.5],
// 4 16 -4.75 0 2.5 -4.75 0 0 -2.25 0 -2.5 4.75 0 2.5
  [4,16,-4.75,0,2.5,-4.75,0,0,-2.25,0,-2.5,4.75,0,2.5],
// 3 16 10 0 10 -4.75 0 2.5 4.75 0 2.5
  [3,16,10,0,10,-4.75,0,2.5,4.75,0,2.5],
// 4 16 2.25 0 -2.5 -2.25 0 -2.5 -2.25 0 -5 2.25 0 -5
  [4,16,2.25,0,-2.5,-2.25,0,-2.5,-2.25,0,-5,2.25,0,-5],
// 3 16 2.25 0 -5 -2.25 0 -5 -10 0 -10
  [3,16,2.25,0,-5,-2.25,0,-5,-10,0,-10],
];
module ldraw_lib__3070bpt1(step=0, col=false, unit=2/5, alt=false, line=0.2, solid=!$preview)
    makepoly(ldraw_lib__3070bpt1(solid), step=step, col=col, unit=unit, alt=alt, line=line, solid=solid);
ldraw_lib__3070bpt1(line=0.2);
